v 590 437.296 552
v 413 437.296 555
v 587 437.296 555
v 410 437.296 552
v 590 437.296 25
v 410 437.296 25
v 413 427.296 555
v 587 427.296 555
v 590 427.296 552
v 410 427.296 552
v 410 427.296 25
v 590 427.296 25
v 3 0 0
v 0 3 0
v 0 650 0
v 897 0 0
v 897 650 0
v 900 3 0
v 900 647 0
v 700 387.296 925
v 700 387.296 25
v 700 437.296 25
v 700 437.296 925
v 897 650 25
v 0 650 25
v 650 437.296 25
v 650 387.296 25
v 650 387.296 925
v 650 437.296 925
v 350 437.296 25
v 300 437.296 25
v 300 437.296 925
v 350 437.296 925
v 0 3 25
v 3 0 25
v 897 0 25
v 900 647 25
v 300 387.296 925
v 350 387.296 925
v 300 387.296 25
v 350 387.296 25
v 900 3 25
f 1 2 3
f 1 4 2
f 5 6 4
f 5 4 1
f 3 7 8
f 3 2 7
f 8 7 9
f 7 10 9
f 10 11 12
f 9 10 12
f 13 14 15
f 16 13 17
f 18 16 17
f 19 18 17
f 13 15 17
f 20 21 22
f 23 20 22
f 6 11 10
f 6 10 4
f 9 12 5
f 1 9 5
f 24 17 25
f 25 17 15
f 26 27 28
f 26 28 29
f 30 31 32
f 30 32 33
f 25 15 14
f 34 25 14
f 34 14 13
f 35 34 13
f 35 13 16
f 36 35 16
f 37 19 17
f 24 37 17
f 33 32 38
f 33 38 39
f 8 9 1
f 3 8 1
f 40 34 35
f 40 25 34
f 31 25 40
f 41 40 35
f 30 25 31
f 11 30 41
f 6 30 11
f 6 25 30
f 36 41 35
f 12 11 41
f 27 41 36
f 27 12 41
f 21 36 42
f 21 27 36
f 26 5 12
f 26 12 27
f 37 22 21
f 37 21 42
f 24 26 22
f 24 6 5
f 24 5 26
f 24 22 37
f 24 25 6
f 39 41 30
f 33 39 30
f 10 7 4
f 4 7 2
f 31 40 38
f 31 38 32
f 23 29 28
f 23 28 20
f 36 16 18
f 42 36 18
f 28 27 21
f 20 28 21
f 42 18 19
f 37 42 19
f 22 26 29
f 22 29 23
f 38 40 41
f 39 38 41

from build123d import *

# Parameters (mm, degrees)
F1_DEPTH  = 25
F2_W      = 50
F2_H      = 50
F3_DEPTH  = 900
F4_W      = 50
F4_H      = 50
F5_DEPTH  = 900
F6_W      = 180
F6_H      = 10
F7_DEPTH  = 530
F10_DEPTH = 10
F11_SIZE  = 3


with BuildPart() as f1:
    # F0 (on Top) → F1 (new body)
    with BuildSketch(Plane.XY):
        Polygon((0, 3), (3, 0), (897, 0), (900, 3), (900, 647), (897, 650), (0, 650), align=None)
    extrude(amount=F1_DEPTH)

    # F2 (on face) → F3 (join)
    with BuildSketch(Plane.XY.offset(25)):
        with Locations((675, 412.296289)):
            Rectangle(F2_W, F2_H)
    extrude(amount=F3_DEPTH)

    # F4 (on face) → F5 (join)
    with BuildSketch(Plane.XY.offset(25)):
        with Locations((325, 412.296289)):
            Rectangle(F4_W, F4_H)
    extrude(amount=F5_DEPTH)

    # F6 (on face) → F7 (join)
    with BuildSketch(Plane.XY.offset(25)):
        with Locations((500, 432.296289)):
            Rectangle(F6_W, F6_H)
    extrude(amount=F7_DEPTH)

    # F9 (on face) → F10 (join, through all)
    with BuildSketch(Plane.XZ.offset(-427.296289)):
        Polygon((410, 555), (410, 552), (413, 555), align=None)
    extrude(amount=-F10_DEPTH)

    # F11
    f11_edges = [f1.edges().sort_by_distance(p)[0] for p in [
        (410, 432.296289, 555),
        (590, 432.296289, 555),
    ]]
    chamfer(f11_edges, length=F11_SIZE)


solid = f1.part
